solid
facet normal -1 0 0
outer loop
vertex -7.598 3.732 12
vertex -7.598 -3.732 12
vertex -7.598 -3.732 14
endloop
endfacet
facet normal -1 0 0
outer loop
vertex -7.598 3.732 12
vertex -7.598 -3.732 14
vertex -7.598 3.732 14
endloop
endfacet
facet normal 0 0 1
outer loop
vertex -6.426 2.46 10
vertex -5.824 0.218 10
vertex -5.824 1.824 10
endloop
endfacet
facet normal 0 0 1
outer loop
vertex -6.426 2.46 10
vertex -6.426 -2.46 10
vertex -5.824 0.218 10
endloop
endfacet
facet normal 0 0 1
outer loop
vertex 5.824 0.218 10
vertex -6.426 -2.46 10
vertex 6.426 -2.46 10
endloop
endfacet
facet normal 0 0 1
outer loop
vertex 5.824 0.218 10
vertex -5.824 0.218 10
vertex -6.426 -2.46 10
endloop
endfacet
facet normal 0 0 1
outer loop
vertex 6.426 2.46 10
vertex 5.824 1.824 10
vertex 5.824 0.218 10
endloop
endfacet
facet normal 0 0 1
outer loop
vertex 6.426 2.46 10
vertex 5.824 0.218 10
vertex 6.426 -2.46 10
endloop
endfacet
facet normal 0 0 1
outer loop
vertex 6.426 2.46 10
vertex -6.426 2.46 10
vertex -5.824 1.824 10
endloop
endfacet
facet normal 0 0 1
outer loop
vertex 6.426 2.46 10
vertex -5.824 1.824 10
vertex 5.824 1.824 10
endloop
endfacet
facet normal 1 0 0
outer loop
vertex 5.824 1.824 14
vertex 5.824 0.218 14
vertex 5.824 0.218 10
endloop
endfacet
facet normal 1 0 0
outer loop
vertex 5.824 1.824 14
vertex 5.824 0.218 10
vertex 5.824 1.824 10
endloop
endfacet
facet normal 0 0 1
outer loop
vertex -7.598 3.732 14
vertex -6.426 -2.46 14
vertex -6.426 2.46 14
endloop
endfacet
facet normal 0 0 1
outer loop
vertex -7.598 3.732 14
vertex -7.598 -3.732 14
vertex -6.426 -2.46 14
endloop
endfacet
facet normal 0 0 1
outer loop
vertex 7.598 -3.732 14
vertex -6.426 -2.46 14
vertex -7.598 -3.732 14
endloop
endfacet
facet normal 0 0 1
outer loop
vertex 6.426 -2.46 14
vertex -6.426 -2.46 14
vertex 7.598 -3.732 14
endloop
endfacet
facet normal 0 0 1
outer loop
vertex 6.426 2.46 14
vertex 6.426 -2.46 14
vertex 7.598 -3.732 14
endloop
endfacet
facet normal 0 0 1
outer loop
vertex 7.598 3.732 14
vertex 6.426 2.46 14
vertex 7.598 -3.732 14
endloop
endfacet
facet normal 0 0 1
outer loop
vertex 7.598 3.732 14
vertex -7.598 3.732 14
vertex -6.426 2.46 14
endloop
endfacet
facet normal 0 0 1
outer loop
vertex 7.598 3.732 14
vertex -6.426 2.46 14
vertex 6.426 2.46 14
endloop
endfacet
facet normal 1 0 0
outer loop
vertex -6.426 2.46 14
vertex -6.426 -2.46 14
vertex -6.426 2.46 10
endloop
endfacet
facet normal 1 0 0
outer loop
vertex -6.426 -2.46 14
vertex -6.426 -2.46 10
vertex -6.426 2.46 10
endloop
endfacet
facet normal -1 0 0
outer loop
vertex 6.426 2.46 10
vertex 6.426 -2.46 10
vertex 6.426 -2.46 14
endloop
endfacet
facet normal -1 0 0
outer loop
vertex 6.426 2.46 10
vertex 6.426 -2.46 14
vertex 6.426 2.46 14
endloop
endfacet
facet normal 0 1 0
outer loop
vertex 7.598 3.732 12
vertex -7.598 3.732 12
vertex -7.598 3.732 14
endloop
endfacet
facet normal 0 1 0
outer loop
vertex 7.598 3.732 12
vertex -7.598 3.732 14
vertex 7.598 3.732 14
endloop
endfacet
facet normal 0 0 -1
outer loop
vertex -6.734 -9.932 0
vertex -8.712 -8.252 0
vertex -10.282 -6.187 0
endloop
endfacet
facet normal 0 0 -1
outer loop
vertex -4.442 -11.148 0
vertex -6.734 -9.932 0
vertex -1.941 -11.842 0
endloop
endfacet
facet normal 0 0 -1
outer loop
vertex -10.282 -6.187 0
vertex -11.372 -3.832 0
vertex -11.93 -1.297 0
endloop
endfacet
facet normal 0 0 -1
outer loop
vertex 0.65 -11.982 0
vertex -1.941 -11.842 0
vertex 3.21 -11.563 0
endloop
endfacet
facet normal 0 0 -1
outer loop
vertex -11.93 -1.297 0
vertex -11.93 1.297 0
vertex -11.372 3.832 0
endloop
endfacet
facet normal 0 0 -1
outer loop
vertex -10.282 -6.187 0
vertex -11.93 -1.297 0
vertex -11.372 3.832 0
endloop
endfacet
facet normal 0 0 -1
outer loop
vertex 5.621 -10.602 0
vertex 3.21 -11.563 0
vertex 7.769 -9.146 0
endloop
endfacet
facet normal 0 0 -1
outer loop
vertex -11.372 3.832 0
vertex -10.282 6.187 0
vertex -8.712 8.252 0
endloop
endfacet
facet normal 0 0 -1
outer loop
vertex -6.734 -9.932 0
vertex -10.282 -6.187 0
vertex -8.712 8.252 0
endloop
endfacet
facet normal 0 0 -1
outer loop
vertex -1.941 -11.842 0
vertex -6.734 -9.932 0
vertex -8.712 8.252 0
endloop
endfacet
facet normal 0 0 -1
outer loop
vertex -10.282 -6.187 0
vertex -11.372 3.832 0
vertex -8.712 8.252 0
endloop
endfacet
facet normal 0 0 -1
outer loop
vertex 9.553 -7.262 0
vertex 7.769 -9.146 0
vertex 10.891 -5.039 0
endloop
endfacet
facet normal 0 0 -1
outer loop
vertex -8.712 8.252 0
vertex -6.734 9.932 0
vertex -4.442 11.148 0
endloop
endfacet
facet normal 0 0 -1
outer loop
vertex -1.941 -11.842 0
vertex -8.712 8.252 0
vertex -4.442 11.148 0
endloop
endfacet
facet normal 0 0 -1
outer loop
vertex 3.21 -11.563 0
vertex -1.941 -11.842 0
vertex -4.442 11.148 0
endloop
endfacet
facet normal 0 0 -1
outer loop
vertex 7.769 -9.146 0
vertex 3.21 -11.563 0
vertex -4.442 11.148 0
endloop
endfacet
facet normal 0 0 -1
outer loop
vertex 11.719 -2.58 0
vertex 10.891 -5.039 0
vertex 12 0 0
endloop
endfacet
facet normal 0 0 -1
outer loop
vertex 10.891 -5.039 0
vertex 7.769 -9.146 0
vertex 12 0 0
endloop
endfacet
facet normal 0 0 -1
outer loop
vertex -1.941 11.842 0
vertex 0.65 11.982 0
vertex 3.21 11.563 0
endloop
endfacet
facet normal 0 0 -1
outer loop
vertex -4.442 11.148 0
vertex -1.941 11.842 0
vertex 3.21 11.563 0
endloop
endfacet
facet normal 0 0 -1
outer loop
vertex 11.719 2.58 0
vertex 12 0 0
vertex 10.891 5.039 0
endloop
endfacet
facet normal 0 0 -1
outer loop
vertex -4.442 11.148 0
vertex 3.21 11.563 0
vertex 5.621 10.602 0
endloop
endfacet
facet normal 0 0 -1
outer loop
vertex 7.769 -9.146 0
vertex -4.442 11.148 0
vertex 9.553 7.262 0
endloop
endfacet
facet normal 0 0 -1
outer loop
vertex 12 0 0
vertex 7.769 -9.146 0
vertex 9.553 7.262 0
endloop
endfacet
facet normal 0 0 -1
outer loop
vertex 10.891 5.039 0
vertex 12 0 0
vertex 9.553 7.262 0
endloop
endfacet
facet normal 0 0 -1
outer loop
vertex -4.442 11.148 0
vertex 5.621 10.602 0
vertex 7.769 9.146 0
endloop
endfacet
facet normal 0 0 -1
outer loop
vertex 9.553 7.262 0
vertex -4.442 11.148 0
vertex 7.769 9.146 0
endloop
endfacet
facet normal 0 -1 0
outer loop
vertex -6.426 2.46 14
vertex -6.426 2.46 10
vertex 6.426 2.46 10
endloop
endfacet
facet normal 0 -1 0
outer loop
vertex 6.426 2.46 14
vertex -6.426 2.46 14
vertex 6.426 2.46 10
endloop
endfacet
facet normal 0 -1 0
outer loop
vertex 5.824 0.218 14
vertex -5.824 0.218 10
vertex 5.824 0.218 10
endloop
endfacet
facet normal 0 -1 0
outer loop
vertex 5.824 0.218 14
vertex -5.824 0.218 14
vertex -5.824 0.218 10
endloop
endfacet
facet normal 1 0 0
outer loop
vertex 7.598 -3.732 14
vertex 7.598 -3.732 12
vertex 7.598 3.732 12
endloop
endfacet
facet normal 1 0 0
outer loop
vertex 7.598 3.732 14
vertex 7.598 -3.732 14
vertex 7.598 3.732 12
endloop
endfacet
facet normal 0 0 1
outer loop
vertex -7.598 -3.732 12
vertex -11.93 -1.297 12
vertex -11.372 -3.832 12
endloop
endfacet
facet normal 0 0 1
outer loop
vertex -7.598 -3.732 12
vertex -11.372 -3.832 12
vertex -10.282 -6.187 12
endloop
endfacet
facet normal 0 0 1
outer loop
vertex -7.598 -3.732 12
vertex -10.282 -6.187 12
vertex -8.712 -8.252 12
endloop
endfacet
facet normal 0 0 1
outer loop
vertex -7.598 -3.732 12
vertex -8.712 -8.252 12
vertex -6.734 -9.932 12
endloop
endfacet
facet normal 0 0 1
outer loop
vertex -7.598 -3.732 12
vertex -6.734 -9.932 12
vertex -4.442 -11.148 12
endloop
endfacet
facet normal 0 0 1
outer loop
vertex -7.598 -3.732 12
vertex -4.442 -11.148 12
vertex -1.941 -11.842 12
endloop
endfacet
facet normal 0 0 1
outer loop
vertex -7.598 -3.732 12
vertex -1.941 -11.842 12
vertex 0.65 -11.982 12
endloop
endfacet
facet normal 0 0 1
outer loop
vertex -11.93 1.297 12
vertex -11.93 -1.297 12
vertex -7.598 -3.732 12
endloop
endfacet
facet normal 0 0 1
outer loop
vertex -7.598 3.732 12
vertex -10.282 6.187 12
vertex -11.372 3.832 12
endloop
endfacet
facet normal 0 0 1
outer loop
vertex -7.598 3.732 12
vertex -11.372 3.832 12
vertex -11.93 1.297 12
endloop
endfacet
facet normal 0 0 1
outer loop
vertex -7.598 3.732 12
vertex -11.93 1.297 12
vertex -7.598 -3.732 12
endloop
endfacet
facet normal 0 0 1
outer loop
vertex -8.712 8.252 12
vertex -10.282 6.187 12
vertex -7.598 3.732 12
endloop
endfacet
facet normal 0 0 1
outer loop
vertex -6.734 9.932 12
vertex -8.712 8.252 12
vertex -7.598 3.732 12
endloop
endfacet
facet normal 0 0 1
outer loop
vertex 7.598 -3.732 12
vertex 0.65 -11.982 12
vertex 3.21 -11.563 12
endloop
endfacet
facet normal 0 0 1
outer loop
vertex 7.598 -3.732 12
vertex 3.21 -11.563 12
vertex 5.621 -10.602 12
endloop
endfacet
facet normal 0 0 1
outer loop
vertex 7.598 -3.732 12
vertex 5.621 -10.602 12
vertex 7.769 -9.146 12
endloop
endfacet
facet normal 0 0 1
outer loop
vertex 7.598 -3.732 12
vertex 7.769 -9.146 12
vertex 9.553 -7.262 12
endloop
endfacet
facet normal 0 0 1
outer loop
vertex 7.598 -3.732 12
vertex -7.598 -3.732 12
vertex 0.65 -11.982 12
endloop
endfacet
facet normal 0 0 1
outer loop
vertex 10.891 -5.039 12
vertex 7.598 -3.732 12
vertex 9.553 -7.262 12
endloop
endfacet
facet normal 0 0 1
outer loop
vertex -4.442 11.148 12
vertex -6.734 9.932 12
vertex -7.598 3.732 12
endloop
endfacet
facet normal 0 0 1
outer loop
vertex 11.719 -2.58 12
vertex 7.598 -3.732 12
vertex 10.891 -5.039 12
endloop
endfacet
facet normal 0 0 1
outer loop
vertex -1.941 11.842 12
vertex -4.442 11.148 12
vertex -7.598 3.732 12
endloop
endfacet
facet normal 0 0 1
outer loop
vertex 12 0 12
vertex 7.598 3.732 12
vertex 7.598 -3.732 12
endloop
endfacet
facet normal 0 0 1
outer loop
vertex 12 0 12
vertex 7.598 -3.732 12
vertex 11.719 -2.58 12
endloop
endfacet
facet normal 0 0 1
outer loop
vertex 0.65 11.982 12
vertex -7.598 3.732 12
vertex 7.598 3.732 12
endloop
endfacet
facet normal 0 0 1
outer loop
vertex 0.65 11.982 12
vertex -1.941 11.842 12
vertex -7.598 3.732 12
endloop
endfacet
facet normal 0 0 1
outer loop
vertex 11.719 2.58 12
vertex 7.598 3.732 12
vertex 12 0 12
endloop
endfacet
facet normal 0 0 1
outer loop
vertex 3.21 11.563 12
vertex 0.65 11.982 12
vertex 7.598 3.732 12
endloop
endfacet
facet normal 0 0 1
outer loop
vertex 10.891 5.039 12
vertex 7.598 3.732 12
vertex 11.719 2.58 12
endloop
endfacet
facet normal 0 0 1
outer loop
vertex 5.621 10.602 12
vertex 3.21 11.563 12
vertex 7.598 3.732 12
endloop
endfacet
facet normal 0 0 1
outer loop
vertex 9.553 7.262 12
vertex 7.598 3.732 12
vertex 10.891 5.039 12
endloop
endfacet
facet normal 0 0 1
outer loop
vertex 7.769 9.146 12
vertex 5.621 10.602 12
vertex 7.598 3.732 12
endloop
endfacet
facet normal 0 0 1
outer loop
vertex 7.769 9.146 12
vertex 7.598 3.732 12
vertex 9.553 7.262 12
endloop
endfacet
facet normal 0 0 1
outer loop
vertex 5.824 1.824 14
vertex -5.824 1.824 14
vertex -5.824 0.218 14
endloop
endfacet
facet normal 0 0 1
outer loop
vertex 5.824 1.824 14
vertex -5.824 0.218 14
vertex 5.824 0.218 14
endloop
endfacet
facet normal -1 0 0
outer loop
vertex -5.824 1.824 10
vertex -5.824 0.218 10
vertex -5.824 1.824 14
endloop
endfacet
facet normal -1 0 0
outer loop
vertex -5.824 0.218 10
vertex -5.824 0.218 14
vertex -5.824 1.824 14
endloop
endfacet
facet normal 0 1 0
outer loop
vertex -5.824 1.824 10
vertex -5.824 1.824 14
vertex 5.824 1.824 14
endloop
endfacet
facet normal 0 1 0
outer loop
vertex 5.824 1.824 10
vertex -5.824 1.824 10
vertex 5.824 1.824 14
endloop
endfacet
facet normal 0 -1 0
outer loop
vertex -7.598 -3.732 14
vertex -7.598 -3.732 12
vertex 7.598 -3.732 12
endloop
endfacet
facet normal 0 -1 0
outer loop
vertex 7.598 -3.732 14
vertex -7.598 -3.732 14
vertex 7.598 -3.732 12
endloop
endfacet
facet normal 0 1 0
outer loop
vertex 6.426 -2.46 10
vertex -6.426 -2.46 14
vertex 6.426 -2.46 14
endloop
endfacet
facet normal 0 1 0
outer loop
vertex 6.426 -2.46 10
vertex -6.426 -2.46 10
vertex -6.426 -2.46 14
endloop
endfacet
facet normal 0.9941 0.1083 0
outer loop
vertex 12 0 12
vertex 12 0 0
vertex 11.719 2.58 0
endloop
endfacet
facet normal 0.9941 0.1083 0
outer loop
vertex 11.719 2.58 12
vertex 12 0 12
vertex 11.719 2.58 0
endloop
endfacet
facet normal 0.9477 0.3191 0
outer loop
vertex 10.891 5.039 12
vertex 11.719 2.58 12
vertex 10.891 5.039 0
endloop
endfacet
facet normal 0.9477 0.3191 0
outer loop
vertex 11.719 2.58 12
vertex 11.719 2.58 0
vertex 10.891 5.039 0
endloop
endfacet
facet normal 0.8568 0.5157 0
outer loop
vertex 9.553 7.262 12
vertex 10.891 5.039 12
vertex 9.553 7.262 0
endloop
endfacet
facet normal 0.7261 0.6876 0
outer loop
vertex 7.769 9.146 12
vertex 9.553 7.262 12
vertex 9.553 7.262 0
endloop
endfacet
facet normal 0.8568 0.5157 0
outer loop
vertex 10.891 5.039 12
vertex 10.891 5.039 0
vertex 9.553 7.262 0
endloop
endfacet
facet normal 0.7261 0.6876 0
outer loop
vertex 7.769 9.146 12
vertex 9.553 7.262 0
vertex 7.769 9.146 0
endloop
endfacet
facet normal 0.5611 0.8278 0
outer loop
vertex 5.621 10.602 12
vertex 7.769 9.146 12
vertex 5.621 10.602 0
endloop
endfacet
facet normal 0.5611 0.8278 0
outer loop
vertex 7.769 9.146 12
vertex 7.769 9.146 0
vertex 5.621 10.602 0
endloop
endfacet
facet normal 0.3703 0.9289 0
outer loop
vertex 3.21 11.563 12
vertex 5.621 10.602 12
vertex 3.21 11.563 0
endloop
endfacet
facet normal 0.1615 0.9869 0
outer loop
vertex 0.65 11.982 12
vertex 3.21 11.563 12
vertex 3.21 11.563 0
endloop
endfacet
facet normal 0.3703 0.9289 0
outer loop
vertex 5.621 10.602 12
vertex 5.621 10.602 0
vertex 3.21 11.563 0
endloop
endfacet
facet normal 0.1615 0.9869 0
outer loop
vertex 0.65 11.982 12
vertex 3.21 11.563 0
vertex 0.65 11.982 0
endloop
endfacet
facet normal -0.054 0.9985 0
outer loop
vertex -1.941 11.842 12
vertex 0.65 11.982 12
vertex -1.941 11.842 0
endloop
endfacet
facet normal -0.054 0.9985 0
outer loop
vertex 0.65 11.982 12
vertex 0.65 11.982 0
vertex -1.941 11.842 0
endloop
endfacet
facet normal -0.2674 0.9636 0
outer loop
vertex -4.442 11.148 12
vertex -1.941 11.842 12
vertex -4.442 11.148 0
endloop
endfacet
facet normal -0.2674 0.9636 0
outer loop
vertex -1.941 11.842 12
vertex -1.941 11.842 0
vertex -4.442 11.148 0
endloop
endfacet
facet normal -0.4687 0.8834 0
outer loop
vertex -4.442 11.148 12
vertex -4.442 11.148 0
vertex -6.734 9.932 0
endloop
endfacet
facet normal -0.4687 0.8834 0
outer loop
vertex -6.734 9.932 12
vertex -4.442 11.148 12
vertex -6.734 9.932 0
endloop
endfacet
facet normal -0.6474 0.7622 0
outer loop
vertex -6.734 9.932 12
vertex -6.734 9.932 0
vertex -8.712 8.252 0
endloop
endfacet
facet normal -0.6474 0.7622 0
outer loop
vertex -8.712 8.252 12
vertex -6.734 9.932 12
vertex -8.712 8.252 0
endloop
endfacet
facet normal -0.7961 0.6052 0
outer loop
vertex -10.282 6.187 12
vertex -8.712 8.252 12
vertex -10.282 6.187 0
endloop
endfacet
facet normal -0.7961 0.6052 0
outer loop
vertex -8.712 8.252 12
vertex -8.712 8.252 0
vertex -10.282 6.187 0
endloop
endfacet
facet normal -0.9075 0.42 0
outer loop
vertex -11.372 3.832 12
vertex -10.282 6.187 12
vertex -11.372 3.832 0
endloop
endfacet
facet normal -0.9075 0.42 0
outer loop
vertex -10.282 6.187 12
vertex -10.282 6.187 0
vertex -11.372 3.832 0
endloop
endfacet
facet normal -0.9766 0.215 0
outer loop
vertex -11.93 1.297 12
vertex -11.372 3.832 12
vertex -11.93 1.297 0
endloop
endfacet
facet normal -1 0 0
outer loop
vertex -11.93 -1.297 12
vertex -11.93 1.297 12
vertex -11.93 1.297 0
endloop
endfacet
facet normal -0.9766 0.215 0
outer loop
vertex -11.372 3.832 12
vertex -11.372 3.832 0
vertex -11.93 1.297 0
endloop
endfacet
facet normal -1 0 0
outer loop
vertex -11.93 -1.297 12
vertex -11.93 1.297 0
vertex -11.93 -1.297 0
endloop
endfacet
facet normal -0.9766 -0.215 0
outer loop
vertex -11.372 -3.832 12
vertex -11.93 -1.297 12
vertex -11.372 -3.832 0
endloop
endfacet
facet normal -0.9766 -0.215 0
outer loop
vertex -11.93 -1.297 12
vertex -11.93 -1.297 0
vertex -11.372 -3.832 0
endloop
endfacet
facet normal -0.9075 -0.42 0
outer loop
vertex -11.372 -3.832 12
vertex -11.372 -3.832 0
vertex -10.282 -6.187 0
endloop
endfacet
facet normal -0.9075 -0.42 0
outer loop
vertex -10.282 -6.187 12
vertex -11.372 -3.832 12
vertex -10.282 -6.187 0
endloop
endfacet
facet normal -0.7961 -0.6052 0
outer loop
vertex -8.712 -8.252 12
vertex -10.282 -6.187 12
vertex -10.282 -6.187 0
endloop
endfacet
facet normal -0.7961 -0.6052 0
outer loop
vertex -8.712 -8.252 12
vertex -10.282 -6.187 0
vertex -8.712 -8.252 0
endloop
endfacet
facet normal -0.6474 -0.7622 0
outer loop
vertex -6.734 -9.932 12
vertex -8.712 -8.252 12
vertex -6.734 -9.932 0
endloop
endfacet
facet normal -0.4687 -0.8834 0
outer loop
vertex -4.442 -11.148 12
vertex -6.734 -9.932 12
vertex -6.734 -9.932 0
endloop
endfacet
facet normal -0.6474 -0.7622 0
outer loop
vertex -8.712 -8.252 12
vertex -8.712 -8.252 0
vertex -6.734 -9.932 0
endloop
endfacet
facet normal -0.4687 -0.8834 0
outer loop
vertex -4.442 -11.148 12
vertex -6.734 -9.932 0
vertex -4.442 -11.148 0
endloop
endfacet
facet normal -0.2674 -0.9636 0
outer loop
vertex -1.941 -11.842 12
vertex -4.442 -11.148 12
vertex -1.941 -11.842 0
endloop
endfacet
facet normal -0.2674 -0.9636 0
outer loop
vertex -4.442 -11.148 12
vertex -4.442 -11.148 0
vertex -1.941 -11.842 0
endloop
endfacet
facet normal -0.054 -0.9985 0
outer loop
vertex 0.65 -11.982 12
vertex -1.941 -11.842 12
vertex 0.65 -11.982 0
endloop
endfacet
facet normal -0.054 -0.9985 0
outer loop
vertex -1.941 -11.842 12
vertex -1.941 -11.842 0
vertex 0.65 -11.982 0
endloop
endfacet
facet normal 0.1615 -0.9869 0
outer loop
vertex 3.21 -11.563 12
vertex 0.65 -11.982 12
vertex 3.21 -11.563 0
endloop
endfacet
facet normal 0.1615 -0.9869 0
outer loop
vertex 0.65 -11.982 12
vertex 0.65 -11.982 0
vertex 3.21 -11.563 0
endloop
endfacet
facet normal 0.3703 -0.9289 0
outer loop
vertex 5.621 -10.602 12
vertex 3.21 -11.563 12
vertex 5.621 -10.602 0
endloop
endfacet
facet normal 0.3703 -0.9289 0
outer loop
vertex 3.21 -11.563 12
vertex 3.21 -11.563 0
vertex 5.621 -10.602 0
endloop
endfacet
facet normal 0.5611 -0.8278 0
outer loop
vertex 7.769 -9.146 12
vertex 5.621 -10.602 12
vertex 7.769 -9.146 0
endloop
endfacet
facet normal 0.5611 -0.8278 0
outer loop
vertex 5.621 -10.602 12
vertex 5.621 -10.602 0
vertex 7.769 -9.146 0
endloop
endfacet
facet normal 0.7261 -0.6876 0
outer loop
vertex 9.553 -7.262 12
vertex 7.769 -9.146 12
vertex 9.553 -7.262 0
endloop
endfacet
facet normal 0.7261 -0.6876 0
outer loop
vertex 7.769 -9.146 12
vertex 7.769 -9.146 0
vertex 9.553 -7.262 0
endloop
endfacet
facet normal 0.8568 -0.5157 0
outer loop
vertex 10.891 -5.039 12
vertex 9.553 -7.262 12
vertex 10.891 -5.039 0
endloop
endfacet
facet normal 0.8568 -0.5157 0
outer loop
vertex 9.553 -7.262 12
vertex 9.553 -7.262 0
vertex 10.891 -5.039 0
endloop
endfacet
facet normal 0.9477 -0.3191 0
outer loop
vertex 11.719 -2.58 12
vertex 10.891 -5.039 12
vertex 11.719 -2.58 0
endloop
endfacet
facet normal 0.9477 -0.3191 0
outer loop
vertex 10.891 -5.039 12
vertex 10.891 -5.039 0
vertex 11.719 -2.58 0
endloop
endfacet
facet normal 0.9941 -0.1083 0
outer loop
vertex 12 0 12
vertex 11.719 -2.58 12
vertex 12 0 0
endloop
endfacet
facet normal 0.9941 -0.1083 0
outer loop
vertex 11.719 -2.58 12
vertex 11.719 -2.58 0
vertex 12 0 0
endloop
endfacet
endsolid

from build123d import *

# Parameters (mm, degrees)
SKETCH2_R           = 12
BOSS_EXTRUDE1_DEPTH = 12
SKETCH4_W           = 15.195212274
SKETCH4_H           = 7.463727614
SKETCH4_W_2         = 12.852338134
SKETCH4_H_2         = 4.920035692
BOSS_EXTRUDE2_DEPTH = 2
SKETCH5_W           = 11.647431434
SKETCH5_H           = 1.606542266
BOSS_EXTRUDE3_DEPTH = 2
SKETCH6_W           = 12.852338134
SKETCH6_H           = 4.920035692
SKETCH6_W_2         = 11.647431434
SKETCH6_H_2         = 1.606542266
CUT_EXTRUDE1_DEPTH  = 2


with BuildPart() as part:
    # Sketch2 → Boss-Extrude1 (new body)
    with BuildSketch(Plane.XY):
        Circle(SKETCH2_R)
    extrude(amount=BOSS_EXTRUDE1_DEPTH)

    # Sketch4 → Boss-Extrude2 (add)
    with BuildSketch(Plane.XY.offset(12)):
        Rectangle(SKETCH4_W, SKETCH4_H)
        Rectangle(SKETCH4_W_2, SKETCH4_H_2, mode=Mode.SUBTRACT)
    extrude(amount=BOSS_EXTRUDE2_DEPTH)

    # Sketch5 → Boss-Extrude3 (add)
    with BuildSketch(Plane.XY.offset(12)):
        with Locations((0, 1.020823732)):
            Rectangle(SKETCH5_W, SKETCH5_H)
    extrude(amount=BOSS_EXTRUDE3_DEPTH)

    # Sketch6 → Cut-Extrude1 (cut)
    with BuildSketch(Plane.XY.offset(12)):
        Rectangle(SKETCH6_W, SKETCH6_H)
        with Locations((0, 1.020823732)):
            Rectangle(SKETCH6_W_2, SKETCH6_H_2, mode=Mode.SUBTRACT)
    extrude(amount=-CUT_EXTRUDE1_DEPTH, mode=Mode.SUBTRACT)


solid = part.part
